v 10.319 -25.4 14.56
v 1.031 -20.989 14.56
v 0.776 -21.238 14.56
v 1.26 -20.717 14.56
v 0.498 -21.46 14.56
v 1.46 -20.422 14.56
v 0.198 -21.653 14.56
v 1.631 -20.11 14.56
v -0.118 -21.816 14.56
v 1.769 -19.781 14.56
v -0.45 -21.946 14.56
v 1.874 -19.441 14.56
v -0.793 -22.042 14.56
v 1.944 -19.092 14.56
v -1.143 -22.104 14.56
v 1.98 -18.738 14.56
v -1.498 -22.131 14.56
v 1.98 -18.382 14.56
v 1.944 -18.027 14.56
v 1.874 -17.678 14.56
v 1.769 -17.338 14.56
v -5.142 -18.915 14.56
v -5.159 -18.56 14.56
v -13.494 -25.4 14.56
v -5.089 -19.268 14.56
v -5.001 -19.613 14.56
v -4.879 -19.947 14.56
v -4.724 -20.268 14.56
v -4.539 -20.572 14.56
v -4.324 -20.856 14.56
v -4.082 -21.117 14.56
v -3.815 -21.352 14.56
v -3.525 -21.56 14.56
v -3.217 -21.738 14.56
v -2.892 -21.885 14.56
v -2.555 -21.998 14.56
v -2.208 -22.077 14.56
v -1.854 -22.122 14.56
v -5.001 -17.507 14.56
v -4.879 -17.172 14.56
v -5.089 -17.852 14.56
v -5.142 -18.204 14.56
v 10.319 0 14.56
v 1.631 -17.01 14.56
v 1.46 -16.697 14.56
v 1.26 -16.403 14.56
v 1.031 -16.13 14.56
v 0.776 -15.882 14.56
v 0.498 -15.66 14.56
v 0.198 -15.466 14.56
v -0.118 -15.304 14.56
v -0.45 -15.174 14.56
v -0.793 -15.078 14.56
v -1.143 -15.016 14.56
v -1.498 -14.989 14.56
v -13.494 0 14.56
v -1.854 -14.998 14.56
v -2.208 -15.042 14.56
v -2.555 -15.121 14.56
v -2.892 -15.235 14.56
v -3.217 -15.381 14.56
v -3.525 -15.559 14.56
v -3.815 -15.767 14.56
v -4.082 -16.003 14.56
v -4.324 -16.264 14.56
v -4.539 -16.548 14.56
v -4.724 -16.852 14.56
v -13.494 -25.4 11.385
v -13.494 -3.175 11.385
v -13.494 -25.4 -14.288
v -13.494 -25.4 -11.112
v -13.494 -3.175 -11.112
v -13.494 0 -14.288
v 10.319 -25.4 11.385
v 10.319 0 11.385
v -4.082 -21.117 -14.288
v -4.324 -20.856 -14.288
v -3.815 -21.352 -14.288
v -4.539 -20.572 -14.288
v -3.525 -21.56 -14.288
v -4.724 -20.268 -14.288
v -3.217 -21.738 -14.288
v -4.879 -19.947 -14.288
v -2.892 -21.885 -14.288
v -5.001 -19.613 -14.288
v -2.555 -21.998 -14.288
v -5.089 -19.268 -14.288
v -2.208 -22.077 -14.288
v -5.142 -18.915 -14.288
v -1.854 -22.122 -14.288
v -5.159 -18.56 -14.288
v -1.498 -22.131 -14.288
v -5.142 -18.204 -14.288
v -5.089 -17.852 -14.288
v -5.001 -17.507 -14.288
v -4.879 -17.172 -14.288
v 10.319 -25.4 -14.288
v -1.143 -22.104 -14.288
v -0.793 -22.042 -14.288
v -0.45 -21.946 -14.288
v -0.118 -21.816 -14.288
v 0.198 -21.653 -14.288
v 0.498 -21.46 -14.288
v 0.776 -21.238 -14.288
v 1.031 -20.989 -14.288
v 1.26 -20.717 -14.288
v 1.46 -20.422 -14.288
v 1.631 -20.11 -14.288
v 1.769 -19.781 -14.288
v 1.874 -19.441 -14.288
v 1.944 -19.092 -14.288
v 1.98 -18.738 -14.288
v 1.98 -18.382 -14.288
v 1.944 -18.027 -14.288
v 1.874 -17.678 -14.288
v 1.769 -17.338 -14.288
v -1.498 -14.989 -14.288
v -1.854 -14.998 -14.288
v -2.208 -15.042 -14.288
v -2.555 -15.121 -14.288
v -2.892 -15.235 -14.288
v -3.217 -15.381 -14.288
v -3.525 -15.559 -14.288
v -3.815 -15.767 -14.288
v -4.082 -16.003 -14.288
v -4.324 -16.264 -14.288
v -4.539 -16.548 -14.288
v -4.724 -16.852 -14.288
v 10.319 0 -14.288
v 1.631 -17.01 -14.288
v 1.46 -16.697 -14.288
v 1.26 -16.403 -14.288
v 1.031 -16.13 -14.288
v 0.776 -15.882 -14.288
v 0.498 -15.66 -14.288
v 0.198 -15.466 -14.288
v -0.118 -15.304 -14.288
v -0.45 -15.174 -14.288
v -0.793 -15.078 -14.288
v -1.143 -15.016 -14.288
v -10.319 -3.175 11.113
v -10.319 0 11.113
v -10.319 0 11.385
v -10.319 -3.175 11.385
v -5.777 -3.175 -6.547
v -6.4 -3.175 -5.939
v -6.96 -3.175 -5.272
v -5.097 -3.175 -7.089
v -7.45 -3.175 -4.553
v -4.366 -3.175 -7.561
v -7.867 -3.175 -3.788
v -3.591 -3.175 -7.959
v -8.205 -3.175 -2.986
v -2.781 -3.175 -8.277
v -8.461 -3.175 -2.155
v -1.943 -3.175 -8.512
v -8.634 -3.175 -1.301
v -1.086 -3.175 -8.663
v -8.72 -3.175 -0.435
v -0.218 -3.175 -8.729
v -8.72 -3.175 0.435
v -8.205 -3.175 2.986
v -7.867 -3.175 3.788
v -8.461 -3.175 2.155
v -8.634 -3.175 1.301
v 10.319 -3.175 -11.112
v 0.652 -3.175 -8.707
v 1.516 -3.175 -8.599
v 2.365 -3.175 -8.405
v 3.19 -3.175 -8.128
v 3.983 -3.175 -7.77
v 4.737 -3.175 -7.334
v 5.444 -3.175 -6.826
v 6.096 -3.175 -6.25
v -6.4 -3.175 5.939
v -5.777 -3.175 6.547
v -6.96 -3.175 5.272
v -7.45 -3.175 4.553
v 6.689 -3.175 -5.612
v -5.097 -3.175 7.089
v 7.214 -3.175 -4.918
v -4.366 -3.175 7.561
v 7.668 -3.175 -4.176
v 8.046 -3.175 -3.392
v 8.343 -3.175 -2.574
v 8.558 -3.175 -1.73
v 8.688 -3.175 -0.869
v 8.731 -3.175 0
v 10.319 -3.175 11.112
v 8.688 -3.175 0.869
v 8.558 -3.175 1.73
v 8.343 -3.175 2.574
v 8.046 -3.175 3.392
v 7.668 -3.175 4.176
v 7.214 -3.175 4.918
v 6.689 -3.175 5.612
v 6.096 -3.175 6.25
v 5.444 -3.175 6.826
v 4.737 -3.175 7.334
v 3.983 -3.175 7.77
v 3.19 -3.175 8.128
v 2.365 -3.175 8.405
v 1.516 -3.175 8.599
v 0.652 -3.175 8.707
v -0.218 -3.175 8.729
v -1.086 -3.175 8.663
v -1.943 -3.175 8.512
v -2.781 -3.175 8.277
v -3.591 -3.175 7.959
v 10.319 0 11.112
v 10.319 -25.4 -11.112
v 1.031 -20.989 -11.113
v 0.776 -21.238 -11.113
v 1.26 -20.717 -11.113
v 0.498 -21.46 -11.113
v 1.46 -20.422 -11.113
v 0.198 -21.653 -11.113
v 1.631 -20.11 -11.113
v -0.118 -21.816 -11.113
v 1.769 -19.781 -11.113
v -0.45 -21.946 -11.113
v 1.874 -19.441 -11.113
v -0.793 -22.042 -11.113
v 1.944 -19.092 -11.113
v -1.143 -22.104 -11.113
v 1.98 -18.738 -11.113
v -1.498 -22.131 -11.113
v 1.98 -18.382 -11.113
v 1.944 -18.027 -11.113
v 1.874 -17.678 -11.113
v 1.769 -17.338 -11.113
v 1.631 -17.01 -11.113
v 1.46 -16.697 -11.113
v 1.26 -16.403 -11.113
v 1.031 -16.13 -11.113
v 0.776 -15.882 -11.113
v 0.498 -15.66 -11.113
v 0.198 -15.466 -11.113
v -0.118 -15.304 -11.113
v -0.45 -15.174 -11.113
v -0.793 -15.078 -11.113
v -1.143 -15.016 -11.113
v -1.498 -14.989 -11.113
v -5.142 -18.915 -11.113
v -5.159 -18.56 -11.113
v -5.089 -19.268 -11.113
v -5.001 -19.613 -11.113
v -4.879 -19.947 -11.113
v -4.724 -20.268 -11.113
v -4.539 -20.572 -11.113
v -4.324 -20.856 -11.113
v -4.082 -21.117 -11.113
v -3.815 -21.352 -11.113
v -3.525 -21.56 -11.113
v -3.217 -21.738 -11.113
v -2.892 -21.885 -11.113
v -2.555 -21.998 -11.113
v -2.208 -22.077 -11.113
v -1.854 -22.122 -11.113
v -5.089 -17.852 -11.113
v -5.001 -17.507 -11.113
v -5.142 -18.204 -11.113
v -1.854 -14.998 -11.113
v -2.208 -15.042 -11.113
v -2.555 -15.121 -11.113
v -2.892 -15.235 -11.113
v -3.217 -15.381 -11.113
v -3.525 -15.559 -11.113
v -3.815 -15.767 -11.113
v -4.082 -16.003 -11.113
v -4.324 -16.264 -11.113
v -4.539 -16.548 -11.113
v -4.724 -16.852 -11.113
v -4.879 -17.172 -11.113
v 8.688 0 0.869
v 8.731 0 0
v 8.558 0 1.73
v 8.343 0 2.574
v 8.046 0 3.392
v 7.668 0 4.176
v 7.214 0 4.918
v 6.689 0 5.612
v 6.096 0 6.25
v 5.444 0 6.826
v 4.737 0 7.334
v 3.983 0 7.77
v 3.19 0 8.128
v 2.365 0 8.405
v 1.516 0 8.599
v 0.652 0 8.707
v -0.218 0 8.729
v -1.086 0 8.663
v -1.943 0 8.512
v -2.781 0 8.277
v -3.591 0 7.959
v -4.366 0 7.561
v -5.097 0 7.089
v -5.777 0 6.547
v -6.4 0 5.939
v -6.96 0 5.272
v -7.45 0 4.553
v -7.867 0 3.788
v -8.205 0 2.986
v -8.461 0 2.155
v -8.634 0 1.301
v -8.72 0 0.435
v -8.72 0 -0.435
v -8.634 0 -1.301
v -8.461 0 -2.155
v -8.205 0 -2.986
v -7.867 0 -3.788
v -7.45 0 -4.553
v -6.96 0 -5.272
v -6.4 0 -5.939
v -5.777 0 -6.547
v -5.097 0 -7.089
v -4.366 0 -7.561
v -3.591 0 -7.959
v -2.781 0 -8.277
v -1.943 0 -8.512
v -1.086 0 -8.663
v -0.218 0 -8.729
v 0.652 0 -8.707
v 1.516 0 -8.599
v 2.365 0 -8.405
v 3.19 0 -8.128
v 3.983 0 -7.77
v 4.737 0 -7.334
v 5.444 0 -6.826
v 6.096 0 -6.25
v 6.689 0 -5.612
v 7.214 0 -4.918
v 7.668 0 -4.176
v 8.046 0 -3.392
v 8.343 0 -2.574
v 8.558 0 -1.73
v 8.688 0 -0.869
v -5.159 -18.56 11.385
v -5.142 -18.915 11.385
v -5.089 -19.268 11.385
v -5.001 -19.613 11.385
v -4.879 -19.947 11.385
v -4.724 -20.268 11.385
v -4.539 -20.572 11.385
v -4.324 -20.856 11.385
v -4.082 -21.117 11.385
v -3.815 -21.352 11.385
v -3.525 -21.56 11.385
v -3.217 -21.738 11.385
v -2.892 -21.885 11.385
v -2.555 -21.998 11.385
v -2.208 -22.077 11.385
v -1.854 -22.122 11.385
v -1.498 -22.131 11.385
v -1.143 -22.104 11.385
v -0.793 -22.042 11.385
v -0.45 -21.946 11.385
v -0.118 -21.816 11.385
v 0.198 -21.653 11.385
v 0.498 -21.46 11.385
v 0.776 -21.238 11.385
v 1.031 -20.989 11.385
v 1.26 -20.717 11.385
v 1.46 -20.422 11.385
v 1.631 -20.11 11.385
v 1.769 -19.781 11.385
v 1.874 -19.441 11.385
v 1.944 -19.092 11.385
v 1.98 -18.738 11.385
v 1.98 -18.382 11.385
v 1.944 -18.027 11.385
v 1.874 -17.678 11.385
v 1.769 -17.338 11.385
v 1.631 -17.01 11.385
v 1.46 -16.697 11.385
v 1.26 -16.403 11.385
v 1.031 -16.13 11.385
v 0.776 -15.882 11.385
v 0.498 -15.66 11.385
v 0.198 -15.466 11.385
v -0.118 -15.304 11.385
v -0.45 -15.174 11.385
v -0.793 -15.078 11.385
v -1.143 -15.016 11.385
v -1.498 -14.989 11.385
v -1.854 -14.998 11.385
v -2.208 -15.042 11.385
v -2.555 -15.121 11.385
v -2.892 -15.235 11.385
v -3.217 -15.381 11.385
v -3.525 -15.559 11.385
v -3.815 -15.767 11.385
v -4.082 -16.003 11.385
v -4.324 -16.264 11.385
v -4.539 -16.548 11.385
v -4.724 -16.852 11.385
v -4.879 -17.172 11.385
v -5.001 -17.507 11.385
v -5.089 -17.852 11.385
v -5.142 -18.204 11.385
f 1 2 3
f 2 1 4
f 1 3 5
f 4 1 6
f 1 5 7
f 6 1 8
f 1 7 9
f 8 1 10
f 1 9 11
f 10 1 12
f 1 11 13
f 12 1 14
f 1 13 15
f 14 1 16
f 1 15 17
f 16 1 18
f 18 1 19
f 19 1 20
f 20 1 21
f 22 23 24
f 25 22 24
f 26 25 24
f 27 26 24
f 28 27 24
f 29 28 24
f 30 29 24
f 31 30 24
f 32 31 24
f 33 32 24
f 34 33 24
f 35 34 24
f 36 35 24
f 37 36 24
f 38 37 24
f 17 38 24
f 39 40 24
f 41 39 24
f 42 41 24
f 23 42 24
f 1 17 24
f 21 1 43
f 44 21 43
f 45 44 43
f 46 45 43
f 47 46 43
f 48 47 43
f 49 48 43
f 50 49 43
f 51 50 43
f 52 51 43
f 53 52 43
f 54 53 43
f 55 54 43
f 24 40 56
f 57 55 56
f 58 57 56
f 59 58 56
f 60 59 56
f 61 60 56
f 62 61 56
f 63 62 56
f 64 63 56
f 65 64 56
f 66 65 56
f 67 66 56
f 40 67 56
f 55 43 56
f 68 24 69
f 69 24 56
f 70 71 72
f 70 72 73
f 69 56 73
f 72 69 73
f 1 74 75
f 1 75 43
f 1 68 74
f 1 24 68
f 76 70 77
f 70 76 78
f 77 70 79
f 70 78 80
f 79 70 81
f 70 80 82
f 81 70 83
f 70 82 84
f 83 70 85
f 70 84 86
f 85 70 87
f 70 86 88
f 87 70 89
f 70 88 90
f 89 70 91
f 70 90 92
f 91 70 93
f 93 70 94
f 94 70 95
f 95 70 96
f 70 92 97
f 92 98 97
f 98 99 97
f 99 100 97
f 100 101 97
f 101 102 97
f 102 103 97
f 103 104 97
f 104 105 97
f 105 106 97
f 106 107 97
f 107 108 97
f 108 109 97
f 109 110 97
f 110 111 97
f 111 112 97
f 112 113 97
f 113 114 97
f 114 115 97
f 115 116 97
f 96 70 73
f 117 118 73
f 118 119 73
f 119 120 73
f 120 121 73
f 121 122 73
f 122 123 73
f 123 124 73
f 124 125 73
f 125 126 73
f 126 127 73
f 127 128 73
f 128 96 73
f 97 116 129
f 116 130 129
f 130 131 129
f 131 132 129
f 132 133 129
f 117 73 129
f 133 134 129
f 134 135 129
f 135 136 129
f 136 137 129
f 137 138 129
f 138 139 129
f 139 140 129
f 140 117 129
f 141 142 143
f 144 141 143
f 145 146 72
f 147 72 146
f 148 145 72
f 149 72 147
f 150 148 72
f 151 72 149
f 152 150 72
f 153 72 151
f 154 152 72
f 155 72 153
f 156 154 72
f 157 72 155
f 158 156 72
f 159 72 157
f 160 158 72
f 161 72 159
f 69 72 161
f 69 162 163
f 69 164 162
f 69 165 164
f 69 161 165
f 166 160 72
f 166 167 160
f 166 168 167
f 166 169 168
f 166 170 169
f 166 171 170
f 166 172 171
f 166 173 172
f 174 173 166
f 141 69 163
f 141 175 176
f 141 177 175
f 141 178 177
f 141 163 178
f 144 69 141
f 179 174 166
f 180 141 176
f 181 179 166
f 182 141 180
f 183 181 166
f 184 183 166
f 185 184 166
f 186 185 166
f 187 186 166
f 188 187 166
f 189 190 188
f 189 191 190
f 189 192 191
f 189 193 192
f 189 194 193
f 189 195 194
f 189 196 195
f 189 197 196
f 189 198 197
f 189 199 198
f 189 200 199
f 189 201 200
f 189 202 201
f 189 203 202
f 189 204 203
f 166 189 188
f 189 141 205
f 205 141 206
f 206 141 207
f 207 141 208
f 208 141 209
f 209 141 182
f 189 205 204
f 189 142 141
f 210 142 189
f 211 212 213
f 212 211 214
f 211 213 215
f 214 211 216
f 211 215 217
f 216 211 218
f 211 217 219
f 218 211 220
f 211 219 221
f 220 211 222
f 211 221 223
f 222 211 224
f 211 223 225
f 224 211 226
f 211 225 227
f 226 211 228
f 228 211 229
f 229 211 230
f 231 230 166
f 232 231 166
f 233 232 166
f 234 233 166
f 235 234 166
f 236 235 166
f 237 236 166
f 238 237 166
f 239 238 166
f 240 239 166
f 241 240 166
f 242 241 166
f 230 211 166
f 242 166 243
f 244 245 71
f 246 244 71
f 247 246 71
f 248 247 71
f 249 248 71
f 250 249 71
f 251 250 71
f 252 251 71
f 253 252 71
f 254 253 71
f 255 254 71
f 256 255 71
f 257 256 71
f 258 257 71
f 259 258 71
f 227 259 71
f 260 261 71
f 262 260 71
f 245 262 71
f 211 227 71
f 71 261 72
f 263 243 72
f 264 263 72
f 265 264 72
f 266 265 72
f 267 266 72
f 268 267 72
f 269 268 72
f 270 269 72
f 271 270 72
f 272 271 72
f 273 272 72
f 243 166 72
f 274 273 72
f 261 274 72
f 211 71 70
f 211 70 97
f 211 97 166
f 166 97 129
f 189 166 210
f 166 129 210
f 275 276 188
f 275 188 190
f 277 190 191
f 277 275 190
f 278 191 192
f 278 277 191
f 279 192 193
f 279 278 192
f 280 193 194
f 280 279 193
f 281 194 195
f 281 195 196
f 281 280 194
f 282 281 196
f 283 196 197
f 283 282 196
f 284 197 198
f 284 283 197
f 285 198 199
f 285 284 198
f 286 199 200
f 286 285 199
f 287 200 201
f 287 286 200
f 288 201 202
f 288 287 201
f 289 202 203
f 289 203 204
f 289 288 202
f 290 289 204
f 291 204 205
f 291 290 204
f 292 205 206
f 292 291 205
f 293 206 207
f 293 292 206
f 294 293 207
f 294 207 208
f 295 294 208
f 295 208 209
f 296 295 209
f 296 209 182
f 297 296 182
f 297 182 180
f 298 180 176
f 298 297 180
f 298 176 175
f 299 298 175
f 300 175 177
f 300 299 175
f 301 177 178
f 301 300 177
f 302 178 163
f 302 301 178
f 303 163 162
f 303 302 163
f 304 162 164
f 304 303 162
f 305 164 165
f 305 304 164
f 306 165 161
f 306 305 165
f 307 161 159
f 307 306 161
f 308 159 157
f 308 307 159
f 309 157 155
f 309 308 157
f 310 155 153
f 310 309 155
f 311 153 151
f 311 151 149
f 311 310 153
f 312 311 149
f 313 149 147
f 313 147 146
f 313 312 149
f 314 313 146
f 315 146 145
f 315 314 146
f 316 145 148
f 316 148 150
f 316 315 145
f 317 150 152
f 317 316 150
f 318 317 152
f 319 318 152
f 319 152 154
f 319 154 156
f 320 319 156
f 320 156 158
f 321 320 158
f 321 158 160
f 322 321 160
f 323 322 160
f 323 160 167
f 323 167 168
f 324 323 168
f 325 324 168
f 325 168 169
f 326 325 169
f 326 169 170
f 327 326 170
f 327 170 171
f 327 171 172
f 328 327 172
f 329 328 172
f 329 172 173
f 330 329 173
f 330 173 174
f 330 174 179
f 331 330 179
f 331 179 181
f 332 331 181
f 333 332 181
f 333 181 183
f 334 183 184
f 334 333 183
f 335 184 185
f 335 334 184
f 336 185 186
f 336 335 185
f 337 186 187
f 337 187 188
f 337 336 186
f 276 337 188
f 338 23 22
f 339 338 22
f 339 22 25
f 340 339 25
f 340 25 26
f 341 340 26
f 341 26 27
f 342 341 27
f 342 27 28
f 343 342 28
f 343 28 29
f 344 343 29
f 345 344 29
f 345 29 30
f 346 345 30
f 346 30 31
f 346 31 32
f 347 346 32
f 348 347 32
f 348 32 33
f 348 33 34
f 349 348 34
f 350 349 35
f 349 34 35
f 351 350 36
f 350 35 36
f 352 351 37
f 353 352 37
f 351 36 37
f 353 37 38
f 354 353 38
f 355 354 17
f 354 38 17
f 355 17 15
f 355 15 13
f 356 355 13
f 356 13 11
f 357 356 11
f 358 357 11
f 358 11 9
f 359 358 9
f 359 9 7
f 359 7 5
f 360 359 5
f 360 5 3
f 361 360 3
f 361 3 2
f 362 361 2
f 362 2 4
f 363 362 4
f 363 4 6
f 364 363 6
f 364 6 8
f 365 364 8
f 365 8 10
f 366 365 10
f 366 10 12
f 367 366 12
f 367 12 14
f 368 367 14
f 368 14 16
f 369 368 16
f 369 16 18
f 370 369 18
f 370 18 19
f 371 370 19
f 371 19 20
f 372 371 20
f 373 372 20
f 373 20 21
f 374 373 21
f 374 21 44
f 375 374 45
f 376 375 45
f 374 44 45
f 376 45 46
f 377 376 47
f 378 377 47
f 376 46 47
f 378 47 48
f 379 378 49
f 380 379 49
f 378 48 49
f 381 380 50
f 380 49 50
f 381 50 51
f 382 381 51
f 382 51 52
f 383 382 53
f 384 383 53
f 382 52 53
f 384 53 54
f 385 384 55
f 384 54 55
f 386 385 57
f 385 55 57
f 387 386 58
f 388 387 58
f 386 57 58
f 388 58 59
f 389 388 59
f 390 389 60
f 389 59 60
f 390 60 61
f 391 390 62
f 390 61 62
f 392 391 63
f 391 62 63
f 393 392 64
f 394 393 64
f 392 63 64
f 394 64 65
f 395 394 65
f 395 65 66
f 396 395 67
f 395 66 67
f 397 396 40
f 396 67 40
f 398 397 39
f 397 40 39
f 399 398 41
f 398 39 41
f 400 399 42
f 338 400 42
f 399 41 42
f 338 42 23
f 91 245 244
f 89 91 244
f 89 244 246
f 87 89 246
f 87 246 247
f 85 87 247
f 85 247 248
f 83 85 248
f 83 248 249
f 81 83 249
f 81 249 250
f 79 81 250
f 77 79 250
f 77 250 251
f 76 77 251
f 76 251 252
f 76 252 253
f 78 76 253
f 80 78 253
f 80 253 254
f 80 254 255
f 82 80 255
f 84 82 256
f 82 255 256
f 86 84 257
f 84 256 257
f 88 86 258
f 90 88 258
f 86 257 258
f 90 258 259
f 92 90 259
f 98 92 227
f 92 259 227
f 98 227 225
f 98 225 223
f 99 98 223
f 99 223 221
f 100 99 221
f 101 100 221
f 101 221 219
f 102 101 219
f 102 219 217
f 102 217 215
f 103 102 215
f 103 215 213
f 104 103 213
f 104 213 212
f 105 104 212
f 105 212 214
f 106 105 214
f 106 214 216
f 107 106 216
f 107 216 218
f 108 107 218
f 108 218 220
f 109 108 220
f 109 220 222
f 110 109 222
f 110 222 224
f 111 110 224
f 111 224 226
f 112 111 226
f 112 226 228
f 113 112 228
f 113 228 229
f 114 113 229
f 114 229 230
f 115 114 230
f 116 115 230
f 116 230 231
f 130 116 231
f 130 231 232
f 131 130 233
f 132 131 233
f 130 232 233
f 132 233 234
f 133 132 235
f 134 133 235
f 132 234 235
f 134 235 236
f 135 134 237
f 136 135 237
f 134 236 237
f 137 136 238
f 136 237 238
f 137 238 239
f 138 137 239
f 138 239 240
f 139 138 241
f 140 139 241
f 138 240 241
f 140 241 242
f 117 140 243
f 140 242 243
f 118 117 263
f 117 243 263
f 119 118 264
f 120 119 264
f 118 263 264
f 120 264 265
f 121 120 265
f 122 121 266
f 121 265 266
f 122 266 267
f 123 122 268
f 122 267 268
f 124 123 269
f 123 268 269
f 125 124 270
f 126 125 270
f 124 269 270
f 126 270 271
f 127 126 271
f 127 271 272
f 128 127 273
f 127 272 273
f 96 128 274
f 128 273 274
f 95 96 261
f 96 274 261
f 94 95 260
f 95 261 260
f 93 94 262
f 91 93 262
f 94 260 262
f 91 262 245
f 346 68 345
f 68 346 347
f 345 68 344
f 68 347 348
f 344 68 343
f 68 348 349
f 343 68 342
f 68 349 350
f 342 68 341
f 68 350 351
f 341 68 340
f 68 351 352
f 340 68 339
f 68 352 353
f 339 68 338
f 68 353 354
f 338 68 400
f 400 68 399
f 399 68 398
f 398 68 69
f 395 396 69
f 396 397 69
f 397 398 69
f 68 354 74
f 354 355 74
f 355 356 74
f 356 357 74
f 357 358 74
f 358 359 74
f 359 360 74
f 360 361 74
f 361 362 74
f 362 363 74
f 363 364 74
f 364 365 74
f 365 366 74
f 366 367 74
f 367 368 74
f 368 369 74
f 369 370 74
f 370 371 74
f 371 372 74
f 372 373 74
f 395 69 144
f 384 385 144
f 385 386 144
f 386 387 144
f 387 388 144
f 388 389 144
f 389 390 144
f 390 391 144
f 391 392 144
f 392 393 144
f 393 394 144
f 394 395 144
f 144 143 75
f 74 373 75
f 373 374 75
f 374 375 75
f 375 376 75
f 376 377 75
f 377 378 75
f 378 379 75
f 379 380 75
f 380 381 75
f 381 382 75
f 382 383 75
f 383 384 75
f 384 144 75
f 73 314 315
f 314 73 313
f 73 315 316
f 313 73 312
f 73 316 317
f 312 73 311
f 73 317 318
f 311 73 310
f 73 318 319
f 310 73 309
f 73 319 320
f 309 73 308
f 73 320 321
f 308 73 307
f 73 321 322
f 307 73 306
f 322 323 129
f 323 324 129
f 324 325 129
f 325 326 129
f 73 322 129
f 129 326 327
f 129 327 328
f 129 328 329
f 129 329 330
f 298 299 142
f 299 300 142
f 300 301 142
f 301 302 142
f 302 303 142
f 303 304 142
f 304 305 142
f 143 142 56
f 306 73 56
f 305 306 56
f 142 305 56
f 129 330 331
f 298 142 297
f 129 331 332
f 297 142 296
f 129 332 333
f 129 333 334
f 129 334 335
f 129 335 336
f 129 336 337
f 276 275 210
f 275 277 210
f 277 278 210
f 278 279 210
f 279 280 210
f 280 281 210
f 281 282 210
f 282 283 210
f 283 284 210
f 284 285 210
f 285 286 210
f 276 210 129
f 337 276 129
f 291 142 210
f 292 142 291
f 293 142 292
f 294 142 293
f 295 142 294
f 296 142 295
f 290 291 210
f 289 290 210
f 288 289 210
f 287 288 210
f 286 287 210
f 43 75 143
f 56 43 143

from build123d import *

# Parameters (mm, degrees)
F0_W     = 20.6375
F0_H     = 22.225
F0_R     = 8.73125
F1_DEPTH = 3.175
F2_DEPTH = 25.4
F4_D     = 7.14375


# Not quite as in the source:
# - a length typed as a fraction of an inch, garbled in the dataset ("3 / 203.2 mm" for 3/8 in), is restored


with BuildPart() as f1:
    # F0 (on Front) → F1 (new body)
    with BuildSketch(Plane.XZ):
        Rectangle(F0_W, F0_H)
        Circle(F0_R, mode=Mode.SUBTRACT)
        Polygon((-10.31875, -11.1125), (-10.31875, 11.1125), (-10.31875, 11.3854380324), (-13.49375, 11.3854380324), (-13.49375, -11.1125), align=None)
    extrude(amount=F1_DEPTH)

    # F0 (on Front) → F2 (join)
    with BuildSketch(Plane.XZ):
        Polygon((10.31875, -14.2875), (10.31875, -11.1125), (-10.31875, -11.1125), (-13.49375, -11.1125), (-13.49375, -14.2875), align=None)
        Polygon((-13.49375, 11.3854380324), (-10.31875, 11.3854380324), (10.31875, 11.3854380324), (10.31875, 14.5604380324), (-13.49375, 14.5604380324), align=None)
    extrude(amount=F2_DEPTH)

    # F4 (through all)
    with Locations(Plane(origin=(0, 0, -14.2875), x_dir=(1, 0, 0), z_dir=(0, 0, -1))):
        with Locations((-1.5875, 18.5598246753)):
            Hole(F4_D / 2)


solid = f1.part
